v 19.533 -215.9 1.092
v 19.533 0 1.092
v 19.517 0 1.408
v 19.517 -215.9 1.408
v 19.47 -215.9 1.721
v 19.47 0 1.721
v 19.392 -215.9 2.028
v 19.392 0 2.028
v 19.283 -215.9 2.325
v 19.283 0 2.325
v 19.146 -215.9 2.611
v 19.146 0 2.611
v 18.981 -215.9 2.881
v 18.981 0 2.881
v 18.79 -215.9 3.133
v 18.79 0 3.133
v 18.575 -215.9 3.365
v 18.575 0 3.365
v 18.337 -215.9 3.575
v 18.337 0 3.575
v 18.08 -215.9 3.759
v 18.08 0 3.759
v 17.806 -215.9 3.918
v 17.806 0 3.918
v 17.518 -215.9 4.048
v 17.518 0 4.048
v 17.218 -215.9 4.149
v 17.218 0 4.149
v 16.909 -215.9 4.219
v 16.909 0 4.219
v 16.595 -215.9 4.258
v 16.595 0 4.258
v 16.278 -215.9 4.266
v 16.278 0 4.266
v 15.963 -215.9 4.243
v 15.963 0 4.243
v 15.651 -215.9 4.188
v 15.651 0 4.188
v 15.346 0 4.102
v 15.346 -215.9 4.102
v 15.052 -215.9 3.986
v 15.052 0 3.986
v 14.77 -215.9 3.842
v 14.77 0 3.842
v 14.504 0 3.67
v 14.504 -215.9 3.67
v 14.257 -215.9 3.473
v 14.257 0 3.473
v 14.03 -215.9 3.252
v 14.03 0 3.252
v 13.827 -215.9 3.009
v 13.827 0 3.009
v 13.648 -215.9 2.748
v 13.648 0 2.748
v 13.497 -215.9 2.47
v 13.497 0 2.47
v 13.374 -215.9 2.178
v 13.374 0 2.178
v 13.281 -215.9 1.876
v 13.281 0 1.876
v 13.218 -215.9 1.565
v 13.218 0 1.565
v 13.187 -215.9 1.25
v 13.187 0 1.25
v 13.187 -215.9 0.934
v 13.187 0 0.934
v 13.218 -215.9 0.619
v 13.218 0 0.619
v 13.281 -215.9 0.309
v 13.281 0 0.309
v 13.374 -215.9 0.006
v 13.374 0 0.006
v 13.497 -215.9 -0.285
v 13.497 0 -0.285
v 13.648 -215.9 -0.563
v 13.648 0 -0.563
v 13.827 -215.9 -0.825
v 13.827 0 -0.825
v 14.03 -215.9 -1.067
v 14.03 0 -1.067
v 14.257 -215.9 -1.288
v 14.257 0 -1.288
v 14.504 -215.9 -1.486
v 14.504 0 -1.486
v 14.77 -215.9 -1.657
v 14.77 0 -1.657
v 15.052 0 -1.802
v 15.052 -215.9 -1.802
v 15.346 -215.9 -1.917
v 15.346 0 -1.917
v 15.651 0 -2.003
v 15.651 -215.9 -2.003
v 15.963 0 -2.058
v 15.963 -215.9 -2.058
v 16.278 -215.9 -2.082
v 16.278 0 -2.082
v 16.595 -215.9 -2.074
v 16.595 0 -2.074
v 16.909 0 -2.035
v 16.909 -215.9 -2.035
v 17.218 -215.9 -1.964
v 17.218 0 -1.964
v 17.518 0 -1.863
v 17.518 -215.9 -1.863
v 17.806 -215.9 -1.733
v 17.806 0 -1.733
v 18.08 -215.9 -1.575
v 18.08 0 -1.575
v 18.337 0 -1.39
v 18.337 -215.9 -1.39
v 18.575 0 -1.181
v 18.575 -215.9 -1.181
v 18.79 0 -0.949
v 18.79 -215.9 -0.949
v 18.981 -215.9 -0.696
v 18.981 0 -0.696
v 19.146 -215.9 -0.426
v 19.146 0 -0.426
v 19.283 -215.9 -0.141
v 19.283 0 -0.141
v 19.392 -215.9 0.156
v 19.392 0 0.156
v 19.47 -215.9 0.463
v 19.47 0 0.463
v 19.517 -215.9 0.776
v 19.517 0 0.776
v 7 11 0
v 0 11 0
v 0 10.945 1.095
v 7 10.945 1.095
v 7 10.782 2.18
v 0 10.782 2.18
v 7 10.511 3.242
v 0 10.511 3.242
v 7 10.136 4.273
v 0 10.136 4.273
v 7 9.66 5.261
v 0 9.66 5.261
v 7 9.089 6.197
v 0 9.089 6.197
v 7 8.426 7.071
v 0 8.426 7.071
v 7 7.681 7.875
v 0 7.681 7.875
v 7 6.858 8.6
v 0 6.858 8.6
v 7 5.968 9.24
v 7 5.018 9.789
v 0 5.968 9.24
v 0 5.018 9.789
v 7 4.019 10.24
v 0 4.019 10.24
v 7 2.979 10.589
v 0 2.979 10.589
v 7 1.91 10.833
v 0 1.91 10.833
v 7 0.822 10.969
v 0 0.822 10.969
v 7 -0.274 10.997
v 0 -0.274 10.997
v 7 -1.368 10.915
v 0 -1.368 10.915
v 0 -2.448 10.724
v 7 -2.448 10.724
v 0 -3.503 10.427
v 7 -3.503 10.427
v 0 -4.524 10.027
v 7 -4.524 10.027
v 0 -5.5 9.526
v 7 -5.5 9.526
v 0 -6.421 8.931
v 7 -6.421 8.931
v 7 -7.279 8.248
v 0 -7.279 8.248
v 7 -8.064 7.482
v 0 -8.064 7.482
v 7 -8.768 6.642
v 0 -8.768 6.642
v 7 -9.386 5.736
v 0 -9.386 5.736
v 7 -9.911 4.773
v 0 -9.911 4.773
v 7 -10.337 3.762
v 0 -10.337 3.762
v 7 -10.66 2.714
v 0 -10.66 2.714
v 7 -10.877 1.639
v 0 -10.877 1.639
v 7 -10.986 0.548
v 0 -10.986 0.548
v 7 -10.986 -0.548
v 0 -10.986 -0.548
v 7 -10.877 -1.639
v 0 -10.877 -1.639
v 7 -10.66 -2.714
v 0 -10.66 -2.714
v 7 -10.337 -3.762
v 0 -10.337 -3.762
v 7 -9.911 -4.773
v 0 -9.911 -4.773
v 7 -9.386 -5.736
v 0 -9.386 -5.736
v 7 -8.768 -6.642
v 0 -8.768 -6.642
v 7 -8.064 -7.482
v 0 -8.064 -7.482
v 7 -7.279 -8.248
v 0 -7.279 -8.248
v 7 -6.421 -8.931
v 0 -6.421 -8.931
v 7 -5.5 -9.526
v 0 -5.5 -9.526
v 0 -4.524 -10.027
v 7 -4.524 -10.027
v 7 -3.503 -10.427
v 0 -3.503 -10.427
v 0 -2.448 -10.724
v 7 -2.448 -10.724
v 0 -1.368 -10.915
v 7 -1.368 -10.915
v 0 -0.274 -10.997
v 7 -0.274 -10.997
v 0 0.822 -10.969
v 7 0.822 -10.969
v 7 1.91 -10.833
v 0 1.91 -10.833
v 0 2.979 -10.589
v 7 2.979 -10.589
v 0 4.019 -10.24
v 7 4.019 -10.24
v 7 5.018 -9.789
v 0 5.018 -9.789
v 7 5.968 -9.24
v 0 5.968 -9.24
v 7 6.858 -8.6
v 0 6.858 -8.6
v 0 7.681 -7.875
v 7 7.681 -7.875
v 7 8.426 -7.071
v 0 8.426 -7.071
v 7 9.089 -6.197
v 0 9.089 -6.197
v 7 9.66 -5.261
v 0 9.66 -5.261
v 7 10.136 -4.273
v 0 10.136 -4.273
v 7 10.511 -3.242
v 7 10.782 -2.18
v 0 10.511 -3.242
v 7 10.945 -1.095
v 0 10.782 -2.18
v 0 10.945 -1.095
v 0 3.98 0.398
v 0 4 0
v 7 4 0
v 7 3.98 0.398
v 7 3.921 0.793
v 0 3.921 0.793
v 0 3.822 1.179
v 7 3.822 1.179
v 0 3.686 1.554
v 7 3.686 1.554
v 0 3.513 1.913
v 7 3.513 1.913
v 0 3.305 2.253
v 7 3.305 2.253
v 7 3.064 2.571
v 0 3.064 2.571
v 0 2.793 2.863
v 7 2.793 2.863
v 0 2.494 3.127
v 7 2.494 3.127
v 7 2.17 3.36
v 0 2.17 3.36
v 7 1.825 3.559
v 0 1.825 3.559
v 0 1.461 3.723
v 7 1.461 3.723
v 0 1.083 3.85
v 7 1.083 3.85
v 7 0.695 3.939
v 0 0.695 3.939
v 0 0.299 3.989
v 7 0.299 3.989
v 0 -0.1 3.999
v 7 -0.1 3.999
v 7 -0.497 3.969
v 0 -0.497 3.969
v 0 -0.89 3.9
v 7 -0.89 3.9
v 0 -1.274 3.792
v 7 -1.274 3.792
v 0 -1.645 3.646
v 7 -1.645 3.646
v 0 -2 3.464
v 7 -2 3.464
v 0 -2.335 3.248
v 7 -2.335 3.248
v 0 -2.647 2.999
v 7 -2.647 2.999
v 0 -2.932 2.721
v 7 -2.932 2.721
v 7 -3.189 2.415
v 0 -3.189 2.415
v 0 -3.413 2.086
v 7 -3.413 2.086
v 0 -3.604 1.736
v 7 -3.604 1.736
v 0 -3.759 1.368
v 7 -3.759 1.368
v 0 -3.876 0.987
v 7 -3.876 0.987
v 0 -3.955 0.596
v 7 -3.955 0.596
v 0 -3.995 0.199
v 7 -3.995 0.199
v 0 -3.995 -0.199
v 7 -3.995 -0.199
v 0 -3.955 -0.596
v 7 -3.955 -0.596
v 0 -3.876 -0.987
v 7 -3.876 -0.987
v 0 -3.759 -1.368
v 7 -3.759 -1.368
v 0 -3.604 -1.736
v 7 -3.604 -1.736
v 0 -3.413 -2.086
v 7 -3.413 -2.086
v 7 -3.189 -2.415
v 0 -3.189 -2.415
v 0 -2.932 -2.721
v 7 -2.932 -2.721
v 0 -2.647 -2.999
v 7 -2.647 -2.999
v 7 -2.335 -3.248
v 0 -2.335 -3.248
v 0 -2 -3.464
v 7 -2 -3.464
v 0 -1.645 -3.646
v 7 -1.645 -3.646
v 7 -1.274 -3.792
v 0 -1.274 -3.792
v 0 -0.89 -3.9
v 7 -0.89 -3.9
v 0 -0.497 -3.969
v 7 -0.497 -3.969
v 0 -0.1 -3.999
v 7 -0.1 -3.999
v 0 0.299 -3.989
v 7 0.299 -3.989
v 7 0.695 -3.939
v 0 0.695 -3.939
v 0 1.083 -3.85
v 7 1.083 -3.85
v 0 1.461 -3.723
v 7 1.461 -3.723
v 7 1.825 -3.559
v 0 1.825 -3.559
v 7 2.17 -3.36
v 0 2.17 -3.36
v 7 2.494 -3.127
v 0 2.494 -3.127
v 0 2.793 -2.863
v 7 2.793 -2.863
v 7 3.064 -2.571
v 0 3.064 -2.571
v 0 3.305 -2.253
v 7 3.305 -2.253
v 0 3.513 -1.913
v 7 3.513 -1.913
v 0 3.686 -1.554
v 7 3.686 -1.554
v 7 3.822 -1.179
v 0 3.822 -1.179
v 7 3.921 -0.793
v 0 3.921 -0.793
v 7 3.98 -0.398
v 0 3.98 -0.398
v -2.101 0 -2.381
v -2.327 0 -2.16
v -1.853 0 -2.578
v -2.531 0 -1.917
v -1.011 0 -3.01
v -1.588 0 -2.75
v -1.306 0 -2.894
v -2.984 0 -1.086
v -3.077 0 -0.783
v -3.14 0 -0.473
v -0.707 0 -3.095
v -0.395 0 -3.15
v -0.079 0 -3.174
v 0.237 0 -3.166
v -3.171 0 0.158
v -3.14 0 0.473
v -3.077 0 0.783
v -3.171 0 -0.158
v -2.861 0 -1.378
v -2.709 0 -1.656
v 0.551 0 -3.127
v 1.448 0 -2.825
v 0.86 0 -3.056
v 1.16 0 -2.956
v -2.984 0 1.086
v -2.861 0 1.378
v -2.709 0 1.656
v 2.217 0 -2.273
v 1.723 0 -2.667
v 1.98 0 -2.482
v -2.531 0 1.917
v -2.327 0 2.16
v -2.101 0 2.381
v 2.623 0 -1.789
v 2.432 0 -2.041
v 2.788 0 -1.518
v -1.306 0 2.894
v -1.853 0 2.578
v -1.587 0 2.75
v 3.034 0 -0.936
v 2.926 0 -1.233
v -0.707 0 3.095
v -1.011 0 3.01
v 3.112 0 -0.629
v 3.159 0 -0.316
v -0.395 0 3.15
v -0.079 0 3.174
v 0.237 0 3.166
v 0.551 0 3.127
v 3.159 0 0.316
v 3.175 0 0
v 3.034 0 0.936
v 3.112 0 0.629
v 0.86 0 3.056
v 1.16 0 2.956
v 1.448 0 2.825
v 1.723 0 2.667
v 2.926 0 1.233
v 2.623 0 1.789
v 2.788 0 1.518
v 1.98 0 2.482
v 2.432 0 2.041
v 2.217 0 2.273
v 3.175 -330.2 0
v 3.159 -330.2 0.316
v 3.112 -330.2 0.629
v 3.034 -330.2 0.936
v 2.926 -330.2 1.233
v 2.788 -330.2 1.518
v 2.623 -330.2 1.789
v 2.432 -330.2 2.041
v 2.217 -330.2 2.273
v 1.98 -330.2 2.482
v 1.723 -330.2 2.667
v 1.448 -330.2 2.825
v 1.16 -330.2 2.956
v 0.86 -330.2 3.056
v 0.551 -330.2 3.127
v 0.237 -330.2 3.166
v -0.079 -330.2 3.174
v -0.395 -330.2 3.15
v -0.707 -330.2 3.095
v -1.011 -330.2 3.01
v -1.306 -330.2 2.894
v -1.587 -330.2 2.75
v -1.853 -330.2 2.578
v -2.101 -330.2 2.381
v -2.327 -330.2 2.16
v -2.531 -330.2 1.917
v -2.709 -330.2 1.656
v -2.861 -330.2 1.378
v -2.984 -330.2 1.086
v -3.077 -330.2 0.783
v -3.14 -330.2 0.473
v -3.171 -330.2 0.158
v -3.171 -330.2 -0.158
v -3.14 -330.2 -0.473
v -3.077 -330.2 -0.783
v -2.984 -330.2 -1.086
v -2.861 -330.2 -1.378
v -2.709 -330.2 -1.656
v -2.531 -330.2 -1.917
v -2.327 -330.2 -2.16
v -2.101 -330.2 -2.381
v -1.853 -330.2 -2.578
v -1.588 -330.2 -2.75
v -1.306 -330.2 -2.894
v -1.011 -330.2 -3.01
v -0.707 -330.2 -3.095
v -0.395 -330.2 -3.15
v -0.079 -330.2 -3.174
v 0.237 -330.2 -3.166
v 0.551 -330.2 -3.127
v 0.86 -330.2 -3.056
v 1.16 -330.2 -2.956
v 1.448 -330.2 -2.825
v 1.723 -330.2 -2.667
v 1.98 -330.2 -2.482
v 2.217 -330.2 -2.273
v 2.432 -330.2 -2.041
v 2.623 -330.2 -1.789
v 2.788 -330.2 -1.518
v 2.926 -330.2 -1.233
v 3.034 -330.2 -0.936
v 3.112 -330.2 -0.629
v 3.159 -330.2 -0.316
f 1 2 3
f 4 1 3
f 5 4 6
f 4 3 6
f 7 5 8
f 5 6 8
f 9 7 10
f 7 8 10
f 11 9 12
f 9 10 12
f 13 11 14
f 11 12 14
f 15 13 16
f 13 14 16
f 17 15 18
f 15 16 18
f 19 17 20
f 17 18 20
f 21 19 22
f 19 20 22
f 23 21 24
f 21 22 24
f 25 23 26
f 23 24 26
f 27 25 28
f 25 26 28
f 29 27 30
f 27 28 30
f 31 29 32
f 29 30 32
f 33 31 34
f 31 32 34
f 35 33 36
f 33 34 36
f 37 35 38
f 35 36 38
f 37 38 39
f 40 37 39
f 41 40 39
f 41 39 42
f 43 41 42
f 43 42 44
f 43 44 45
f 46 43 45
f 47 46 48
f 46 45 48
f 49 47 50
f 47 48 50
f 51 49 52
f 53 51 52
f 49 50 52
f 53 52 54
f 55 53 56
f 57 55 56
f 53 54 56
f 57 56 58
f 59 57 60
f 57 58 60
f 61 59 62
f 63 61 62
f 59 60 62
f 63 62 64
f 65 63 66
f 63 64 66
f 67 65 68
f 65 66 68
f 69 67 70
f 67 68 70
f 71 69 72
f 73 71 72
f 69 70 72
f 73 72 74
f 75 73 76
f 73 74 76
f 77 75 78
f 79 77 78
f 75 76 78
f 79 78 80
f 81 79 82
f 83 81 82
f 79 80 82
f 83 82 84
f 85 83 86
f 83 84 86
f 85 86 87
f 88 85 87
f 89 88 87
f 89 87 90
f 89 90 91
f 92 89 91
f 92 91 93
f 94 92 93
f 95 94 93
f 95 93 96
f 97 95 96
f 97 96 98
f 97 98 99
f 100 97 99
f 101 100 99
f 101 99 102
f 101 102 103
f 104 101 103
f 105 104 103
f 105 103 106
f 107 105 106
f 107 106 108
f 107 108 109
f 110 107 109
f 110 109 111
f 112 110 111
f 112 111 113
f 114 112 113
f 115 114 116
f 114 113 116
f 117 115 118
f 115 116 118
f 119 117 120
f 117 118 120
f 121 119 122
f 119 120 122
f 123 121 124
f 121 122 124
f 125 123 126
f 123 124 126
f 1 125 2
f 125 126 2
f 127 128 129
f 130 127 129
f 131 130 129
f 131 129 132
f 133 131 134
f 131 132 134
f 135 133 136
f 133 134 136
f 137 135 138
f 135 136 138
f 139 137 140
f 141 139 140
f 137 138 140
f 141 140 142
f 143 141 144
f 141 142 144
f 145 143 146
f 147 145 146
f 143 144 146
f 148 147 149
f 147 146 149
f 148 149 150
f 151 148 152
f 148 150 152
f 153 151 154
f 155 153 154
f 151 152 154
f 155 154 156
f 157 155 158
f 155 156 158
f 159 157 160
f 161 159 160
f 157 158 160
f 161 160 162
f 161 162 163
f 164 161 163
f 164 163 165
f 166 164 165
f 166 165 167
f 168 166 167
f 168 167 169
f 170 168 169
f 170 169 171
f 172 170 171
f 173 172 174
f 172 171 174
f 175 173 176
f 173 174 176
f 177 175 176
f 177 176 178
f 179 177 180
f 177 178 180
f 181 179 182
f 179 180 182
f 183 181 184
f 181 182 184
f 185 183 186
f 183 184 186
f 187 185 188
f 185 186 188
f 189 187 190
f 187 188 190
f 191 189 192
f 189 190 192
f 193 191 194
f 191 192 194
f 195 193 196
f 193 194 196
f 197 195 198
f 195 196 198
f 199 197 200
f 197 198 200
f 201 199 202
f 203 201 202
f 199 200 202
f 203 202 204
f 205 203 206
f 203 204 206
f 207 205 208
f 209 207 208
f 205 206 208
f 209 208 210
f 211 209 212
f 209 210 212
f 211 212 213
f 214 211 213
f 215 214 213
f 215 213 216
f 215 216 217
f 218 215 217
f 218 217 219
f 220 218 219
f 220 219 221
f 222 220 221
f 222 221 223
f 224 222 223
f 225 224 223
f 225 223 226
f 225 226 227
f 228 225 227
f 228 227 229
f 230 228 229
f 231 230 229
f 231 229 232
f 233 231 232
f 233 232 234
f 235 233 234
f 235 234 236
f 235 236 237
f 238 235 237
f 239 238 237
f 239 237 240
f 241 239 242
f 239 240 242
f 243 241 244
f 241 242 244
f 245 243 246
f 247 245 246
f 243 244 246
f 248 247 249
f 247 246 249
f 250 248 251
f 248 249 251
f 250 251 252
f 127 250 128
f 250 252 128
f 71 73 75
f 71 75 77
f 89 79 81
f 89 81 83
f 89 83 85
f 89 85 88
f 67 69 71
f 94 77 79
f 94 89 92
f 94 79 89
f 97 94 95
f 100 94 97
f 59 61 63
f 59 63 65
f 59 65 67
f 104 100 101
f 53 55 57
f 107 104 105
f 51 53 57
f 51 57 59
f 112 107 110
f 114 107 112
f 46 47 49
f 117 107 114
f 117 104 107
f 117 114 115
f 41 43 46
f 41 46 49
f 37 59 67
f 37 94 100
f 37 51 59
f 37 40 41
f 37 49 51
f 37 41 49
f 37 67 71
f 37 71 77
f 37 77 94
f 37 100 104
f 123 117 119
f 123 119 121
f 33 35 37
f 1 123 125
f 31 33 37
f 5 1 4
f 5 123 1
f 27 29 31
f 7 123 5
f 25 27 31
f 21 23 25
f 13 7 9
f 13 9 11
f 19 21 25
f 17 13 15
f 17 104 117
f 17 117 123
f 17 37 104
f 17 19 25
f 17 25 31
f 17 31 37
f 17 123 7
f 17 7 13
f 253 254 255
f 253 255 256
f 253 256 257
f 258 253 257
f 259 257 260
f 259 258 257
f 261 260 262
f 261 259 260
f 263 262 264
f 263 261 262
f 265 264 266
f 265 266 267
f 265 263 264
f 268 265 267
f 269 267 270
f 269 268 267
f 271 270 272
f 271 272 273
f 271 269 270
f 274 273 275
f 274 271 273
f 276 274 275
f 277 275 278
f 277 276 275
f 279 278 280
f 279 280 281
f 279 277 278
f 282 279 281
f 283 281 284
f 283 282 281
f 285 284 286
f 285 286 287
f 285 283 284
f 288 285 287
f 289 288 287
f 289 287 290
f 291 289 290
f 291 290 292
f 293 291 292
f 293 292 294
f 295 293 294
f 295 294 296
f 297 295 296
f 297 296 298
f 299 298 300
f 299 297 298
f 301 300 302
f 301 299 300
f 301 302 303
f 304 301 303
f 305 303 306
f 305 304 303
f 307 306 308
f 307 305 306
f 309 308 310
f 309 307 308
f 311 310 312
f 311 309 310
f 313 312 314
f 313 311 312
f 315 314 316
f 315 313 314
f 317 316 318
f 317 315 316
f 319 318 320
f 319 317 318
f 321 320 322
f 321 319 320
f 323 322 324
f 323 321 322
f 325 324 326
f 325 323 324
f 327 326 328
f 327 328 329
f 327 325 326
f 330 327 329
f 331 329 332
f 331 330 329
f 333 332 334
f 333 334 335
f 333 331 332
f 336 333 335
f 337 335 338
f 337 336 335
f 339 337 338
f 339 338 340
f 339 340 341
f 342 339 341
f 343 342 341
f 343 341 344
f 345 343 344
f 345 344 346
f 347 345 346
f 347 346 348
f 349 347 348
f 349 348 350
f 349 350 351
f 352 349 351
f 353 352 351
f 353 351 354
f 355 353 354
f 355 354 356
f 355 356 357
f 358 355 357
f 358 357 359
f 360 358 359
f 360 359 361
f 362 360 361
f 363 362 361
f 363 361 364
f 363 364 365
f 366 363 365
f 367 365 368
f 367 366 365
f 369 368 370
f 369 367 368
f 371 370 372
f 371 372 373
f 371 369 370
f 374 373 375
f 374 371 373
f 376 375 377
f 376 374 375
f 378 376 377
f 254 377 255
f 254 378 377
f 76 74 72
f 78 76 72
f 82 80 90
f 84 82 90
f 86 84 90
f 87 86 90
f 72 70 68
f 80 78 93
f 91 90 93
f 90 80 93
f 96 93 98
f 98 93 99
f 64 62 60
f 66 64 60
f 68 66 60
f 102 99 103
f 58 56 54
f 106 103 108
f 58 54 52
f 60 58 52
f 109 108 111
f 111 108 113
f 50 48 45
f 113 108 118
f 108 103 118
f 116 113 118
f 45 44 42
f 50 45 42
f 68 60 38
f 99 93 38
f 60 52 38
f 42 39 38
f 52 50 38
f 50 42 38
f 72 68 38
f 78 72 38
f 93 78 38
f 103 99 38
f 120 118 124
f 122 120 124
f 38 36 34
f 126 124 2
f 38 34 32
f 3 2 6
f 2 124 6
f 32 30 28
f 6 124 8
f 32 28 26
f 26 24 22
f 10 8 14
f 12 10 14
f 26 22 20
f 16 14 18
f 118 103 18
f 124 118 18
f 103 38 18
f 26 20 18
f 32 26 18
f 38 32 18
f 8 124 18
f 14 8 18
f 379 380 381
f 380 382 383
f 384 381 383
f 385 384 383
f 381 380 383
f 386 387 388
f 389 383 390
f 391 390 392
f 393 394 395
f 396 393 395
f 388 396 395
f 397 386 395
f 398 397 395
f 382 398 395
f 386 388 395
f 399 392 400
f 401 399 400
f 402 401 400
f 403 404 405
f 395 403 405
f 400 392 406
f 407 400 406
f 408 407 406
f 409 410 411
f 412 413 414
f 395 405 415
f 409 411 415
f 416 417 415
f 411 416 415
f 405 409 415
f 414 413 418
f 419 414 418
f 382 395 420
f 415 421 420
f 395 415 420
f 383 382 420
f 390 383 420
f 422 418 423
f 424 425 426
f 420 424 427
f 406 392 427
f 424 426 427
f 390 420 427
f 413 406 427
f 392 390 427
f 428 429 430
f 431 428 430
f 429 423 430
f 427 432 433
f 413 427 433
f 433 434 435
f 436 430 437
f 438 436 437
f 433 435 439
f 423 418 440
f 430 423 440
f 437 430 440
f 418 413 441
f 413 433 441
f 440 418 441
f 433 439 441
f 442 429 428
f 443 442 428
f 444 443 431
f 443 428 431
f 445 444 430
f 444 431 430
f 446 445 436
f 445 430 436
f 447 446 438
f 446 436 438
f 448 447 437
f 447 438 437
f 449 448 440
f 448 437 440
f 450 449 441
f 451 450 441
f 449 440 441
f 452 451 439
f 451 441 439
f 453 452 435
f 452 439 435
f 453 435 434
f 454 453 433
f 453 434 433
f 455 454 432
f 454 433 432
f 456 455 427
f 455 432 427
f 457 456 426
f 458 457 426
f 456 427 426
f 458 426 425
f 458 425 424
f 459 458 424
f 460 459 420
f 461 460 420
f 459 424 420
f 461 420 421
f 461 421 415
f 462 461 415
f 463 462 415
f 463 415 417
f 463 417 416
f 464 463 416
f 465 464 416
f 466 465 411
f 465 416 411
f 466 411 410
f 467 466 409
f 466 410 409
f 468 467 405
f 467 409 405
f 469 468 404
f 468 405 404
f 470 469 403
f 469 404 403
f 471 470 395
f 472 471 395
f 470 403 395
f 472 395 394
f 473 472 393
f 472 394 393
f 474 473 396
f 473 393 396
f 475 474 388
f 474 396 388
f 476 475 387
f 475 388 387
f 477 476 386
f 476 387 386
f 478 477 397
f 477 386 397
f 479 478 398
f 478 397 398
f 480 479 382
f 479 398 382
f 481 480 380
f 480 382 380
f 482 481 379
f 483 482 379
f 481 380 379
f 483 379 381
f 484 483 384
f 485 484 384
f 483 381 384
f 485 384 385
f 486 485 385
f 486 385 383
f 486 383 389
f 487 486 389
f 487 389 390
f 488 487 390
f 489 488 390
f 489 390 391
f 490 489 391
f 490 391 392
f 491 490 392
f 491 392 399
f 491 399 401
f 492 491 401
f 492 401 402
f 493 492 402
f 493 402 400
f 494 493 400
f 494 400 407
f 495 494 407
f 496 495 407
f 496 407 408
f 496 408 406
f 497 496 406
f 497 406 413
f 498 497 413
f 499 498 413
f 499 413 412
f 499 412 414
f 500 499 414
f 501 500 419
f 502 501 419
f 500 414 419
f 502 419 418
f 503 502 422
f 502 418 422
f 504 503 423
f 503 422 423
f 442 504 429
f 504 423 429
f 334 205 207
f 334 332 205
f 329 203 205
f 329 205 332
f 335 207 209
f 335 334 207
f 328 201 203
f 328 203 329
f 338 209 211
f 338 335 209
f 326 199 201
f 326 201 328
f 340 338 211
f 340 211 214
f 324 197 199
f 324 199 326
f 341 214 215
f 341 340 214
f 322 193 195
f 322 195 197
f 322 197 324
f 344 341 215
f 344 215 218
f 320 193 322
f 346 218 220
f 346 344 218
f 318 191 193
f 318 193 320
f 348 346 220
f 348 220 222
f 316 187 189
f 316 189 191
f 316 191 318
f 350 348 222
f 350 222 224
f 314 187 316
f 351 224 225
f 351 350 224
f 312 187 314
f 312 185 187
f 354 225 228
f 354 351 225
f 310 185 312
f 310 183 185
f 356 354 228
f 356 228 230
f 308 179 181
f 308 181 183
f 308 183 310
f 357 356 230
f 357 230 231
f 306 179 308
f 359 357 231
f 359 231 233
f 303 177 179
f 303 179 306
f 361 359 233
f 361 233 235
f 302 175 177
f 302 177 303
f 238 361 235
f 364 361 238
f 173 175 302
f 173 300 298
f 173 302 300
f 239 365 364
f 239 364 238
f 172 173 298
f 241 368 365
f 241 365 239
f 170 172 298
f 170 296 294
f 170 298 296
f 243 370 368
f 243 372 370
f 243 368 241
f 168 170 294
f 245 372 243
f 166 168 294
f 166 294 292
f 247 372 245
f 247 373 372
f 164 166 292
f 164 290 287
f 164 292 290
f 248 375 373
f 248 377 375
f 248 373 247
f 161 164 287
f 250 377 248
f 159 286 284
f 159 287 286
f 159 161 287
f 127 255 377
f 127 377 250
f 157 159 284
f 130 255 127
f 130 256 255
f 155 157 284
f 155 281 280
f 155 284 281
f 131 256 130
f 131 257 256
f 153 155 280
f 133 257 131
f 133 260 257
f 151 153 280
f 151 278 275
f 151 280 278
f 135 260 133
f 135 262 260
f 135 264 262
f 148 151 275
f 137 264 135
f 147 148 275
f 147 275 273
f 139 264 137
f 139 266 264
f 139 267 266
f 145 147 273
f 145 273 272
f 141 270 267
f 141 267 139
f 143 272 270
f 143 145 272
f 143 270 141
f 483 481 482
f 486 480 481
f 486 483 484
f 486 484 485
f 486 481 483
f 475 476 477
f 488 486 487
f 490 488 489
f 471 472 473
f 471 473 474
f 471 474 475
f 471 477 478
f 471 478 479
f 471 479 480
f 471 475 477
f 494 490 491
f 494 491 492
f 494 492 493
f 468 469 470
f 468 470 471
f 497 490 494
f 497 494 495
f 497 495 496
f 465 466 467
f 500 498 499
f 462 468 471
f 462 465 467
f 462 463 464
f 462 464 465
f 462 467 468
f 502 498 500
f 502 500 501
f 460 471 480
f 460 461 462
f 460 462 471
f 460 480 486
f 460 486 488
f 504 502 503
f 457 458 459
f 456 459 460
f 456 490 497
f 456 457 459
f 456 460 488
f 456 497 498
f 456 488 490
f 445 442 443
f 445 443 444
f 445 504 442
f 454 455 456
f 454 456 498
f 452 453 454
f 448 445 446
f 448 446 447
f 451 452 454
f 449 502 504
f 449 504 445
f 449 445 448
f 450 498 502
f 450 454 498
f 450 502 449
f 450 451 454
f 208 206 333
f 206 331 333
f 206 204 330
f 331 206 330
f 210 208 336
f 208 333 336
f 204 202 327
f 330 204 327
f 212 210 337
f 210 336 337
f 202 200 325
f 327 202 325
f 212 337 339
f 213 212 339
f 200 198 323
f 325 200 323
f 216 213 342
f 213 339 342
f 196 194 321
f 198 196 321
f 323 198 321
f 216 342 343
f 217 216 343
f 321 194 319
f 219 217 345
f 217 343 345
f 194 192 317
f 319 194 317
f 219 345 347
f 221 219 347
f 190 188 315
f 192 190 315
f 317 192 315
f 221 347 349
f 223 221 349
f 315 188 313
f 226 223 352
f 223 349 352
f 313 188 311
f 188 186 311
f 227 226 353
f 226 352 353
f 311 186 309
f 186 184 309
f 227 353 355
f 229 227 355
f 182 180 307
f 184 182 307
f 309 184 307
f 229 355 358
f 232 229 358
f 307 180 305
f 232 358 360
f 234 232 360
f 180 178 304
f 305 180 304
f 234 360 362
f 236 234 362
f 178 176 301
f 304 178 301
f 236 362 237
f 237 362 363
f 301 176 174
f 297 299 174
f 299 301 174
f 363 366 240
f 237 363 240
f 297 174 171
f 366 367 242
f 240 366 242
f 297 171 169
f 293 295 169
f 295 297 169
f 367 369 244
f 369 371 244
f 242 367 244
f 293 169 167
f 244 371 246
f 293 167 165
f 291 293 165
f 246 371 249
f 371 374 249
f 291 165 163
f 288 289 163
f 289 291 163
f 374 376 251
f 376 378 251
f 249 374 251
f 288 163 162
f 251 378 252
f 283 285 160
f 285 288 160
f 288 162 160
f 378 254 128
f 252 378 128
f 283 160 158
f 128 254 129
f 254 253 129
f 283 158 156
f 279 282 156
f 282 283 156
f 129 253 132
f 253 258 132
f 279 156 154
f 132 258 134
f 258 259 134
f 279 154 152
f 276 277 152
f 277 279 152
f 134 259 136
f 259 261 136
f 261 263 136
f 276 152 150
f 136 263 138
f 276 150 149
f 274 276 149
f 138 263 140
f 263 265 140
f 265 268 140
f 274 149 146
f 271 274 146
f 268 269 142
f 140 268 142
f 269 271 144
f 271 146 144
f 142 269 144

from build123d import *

# Parameters (mm, degrees)
F0_R     = 3.175
F1_DEPTH = 330.2
F2_R     = 11
F2_R_2   = 4
F3_DEPTH = 7
F4_R     = 3.175
F5_DEPTH = 215.9


with BuildPart() as f1:
    # F0 (on Front) → F1 (new body)
    with BuildSketch(Plane.XZ):
        Circle(F0_R)
    extrude(amount=F1_DEPTH)


with BuildPart() as f3:
    # F2 (on Right) → F3 (new body)
    with BuildSketch(Plane.YZ):
        Circle(F2_R)
        Circle(F2_R_2, mode=Mode.SUBTRACT)
    extrude(amount=F3_DEPTH)


with BuildPart() as f5:
    # F4 (on Front) → F5 (new body)
    with BuildSketch(Plane.XZ):
        with Locations((16.357601, 1.0922)):
            Circle(F4_R)
    extrude(amount=F5_DEPTH)


solid = Compound([f1.part, f3.part, f5.part])
